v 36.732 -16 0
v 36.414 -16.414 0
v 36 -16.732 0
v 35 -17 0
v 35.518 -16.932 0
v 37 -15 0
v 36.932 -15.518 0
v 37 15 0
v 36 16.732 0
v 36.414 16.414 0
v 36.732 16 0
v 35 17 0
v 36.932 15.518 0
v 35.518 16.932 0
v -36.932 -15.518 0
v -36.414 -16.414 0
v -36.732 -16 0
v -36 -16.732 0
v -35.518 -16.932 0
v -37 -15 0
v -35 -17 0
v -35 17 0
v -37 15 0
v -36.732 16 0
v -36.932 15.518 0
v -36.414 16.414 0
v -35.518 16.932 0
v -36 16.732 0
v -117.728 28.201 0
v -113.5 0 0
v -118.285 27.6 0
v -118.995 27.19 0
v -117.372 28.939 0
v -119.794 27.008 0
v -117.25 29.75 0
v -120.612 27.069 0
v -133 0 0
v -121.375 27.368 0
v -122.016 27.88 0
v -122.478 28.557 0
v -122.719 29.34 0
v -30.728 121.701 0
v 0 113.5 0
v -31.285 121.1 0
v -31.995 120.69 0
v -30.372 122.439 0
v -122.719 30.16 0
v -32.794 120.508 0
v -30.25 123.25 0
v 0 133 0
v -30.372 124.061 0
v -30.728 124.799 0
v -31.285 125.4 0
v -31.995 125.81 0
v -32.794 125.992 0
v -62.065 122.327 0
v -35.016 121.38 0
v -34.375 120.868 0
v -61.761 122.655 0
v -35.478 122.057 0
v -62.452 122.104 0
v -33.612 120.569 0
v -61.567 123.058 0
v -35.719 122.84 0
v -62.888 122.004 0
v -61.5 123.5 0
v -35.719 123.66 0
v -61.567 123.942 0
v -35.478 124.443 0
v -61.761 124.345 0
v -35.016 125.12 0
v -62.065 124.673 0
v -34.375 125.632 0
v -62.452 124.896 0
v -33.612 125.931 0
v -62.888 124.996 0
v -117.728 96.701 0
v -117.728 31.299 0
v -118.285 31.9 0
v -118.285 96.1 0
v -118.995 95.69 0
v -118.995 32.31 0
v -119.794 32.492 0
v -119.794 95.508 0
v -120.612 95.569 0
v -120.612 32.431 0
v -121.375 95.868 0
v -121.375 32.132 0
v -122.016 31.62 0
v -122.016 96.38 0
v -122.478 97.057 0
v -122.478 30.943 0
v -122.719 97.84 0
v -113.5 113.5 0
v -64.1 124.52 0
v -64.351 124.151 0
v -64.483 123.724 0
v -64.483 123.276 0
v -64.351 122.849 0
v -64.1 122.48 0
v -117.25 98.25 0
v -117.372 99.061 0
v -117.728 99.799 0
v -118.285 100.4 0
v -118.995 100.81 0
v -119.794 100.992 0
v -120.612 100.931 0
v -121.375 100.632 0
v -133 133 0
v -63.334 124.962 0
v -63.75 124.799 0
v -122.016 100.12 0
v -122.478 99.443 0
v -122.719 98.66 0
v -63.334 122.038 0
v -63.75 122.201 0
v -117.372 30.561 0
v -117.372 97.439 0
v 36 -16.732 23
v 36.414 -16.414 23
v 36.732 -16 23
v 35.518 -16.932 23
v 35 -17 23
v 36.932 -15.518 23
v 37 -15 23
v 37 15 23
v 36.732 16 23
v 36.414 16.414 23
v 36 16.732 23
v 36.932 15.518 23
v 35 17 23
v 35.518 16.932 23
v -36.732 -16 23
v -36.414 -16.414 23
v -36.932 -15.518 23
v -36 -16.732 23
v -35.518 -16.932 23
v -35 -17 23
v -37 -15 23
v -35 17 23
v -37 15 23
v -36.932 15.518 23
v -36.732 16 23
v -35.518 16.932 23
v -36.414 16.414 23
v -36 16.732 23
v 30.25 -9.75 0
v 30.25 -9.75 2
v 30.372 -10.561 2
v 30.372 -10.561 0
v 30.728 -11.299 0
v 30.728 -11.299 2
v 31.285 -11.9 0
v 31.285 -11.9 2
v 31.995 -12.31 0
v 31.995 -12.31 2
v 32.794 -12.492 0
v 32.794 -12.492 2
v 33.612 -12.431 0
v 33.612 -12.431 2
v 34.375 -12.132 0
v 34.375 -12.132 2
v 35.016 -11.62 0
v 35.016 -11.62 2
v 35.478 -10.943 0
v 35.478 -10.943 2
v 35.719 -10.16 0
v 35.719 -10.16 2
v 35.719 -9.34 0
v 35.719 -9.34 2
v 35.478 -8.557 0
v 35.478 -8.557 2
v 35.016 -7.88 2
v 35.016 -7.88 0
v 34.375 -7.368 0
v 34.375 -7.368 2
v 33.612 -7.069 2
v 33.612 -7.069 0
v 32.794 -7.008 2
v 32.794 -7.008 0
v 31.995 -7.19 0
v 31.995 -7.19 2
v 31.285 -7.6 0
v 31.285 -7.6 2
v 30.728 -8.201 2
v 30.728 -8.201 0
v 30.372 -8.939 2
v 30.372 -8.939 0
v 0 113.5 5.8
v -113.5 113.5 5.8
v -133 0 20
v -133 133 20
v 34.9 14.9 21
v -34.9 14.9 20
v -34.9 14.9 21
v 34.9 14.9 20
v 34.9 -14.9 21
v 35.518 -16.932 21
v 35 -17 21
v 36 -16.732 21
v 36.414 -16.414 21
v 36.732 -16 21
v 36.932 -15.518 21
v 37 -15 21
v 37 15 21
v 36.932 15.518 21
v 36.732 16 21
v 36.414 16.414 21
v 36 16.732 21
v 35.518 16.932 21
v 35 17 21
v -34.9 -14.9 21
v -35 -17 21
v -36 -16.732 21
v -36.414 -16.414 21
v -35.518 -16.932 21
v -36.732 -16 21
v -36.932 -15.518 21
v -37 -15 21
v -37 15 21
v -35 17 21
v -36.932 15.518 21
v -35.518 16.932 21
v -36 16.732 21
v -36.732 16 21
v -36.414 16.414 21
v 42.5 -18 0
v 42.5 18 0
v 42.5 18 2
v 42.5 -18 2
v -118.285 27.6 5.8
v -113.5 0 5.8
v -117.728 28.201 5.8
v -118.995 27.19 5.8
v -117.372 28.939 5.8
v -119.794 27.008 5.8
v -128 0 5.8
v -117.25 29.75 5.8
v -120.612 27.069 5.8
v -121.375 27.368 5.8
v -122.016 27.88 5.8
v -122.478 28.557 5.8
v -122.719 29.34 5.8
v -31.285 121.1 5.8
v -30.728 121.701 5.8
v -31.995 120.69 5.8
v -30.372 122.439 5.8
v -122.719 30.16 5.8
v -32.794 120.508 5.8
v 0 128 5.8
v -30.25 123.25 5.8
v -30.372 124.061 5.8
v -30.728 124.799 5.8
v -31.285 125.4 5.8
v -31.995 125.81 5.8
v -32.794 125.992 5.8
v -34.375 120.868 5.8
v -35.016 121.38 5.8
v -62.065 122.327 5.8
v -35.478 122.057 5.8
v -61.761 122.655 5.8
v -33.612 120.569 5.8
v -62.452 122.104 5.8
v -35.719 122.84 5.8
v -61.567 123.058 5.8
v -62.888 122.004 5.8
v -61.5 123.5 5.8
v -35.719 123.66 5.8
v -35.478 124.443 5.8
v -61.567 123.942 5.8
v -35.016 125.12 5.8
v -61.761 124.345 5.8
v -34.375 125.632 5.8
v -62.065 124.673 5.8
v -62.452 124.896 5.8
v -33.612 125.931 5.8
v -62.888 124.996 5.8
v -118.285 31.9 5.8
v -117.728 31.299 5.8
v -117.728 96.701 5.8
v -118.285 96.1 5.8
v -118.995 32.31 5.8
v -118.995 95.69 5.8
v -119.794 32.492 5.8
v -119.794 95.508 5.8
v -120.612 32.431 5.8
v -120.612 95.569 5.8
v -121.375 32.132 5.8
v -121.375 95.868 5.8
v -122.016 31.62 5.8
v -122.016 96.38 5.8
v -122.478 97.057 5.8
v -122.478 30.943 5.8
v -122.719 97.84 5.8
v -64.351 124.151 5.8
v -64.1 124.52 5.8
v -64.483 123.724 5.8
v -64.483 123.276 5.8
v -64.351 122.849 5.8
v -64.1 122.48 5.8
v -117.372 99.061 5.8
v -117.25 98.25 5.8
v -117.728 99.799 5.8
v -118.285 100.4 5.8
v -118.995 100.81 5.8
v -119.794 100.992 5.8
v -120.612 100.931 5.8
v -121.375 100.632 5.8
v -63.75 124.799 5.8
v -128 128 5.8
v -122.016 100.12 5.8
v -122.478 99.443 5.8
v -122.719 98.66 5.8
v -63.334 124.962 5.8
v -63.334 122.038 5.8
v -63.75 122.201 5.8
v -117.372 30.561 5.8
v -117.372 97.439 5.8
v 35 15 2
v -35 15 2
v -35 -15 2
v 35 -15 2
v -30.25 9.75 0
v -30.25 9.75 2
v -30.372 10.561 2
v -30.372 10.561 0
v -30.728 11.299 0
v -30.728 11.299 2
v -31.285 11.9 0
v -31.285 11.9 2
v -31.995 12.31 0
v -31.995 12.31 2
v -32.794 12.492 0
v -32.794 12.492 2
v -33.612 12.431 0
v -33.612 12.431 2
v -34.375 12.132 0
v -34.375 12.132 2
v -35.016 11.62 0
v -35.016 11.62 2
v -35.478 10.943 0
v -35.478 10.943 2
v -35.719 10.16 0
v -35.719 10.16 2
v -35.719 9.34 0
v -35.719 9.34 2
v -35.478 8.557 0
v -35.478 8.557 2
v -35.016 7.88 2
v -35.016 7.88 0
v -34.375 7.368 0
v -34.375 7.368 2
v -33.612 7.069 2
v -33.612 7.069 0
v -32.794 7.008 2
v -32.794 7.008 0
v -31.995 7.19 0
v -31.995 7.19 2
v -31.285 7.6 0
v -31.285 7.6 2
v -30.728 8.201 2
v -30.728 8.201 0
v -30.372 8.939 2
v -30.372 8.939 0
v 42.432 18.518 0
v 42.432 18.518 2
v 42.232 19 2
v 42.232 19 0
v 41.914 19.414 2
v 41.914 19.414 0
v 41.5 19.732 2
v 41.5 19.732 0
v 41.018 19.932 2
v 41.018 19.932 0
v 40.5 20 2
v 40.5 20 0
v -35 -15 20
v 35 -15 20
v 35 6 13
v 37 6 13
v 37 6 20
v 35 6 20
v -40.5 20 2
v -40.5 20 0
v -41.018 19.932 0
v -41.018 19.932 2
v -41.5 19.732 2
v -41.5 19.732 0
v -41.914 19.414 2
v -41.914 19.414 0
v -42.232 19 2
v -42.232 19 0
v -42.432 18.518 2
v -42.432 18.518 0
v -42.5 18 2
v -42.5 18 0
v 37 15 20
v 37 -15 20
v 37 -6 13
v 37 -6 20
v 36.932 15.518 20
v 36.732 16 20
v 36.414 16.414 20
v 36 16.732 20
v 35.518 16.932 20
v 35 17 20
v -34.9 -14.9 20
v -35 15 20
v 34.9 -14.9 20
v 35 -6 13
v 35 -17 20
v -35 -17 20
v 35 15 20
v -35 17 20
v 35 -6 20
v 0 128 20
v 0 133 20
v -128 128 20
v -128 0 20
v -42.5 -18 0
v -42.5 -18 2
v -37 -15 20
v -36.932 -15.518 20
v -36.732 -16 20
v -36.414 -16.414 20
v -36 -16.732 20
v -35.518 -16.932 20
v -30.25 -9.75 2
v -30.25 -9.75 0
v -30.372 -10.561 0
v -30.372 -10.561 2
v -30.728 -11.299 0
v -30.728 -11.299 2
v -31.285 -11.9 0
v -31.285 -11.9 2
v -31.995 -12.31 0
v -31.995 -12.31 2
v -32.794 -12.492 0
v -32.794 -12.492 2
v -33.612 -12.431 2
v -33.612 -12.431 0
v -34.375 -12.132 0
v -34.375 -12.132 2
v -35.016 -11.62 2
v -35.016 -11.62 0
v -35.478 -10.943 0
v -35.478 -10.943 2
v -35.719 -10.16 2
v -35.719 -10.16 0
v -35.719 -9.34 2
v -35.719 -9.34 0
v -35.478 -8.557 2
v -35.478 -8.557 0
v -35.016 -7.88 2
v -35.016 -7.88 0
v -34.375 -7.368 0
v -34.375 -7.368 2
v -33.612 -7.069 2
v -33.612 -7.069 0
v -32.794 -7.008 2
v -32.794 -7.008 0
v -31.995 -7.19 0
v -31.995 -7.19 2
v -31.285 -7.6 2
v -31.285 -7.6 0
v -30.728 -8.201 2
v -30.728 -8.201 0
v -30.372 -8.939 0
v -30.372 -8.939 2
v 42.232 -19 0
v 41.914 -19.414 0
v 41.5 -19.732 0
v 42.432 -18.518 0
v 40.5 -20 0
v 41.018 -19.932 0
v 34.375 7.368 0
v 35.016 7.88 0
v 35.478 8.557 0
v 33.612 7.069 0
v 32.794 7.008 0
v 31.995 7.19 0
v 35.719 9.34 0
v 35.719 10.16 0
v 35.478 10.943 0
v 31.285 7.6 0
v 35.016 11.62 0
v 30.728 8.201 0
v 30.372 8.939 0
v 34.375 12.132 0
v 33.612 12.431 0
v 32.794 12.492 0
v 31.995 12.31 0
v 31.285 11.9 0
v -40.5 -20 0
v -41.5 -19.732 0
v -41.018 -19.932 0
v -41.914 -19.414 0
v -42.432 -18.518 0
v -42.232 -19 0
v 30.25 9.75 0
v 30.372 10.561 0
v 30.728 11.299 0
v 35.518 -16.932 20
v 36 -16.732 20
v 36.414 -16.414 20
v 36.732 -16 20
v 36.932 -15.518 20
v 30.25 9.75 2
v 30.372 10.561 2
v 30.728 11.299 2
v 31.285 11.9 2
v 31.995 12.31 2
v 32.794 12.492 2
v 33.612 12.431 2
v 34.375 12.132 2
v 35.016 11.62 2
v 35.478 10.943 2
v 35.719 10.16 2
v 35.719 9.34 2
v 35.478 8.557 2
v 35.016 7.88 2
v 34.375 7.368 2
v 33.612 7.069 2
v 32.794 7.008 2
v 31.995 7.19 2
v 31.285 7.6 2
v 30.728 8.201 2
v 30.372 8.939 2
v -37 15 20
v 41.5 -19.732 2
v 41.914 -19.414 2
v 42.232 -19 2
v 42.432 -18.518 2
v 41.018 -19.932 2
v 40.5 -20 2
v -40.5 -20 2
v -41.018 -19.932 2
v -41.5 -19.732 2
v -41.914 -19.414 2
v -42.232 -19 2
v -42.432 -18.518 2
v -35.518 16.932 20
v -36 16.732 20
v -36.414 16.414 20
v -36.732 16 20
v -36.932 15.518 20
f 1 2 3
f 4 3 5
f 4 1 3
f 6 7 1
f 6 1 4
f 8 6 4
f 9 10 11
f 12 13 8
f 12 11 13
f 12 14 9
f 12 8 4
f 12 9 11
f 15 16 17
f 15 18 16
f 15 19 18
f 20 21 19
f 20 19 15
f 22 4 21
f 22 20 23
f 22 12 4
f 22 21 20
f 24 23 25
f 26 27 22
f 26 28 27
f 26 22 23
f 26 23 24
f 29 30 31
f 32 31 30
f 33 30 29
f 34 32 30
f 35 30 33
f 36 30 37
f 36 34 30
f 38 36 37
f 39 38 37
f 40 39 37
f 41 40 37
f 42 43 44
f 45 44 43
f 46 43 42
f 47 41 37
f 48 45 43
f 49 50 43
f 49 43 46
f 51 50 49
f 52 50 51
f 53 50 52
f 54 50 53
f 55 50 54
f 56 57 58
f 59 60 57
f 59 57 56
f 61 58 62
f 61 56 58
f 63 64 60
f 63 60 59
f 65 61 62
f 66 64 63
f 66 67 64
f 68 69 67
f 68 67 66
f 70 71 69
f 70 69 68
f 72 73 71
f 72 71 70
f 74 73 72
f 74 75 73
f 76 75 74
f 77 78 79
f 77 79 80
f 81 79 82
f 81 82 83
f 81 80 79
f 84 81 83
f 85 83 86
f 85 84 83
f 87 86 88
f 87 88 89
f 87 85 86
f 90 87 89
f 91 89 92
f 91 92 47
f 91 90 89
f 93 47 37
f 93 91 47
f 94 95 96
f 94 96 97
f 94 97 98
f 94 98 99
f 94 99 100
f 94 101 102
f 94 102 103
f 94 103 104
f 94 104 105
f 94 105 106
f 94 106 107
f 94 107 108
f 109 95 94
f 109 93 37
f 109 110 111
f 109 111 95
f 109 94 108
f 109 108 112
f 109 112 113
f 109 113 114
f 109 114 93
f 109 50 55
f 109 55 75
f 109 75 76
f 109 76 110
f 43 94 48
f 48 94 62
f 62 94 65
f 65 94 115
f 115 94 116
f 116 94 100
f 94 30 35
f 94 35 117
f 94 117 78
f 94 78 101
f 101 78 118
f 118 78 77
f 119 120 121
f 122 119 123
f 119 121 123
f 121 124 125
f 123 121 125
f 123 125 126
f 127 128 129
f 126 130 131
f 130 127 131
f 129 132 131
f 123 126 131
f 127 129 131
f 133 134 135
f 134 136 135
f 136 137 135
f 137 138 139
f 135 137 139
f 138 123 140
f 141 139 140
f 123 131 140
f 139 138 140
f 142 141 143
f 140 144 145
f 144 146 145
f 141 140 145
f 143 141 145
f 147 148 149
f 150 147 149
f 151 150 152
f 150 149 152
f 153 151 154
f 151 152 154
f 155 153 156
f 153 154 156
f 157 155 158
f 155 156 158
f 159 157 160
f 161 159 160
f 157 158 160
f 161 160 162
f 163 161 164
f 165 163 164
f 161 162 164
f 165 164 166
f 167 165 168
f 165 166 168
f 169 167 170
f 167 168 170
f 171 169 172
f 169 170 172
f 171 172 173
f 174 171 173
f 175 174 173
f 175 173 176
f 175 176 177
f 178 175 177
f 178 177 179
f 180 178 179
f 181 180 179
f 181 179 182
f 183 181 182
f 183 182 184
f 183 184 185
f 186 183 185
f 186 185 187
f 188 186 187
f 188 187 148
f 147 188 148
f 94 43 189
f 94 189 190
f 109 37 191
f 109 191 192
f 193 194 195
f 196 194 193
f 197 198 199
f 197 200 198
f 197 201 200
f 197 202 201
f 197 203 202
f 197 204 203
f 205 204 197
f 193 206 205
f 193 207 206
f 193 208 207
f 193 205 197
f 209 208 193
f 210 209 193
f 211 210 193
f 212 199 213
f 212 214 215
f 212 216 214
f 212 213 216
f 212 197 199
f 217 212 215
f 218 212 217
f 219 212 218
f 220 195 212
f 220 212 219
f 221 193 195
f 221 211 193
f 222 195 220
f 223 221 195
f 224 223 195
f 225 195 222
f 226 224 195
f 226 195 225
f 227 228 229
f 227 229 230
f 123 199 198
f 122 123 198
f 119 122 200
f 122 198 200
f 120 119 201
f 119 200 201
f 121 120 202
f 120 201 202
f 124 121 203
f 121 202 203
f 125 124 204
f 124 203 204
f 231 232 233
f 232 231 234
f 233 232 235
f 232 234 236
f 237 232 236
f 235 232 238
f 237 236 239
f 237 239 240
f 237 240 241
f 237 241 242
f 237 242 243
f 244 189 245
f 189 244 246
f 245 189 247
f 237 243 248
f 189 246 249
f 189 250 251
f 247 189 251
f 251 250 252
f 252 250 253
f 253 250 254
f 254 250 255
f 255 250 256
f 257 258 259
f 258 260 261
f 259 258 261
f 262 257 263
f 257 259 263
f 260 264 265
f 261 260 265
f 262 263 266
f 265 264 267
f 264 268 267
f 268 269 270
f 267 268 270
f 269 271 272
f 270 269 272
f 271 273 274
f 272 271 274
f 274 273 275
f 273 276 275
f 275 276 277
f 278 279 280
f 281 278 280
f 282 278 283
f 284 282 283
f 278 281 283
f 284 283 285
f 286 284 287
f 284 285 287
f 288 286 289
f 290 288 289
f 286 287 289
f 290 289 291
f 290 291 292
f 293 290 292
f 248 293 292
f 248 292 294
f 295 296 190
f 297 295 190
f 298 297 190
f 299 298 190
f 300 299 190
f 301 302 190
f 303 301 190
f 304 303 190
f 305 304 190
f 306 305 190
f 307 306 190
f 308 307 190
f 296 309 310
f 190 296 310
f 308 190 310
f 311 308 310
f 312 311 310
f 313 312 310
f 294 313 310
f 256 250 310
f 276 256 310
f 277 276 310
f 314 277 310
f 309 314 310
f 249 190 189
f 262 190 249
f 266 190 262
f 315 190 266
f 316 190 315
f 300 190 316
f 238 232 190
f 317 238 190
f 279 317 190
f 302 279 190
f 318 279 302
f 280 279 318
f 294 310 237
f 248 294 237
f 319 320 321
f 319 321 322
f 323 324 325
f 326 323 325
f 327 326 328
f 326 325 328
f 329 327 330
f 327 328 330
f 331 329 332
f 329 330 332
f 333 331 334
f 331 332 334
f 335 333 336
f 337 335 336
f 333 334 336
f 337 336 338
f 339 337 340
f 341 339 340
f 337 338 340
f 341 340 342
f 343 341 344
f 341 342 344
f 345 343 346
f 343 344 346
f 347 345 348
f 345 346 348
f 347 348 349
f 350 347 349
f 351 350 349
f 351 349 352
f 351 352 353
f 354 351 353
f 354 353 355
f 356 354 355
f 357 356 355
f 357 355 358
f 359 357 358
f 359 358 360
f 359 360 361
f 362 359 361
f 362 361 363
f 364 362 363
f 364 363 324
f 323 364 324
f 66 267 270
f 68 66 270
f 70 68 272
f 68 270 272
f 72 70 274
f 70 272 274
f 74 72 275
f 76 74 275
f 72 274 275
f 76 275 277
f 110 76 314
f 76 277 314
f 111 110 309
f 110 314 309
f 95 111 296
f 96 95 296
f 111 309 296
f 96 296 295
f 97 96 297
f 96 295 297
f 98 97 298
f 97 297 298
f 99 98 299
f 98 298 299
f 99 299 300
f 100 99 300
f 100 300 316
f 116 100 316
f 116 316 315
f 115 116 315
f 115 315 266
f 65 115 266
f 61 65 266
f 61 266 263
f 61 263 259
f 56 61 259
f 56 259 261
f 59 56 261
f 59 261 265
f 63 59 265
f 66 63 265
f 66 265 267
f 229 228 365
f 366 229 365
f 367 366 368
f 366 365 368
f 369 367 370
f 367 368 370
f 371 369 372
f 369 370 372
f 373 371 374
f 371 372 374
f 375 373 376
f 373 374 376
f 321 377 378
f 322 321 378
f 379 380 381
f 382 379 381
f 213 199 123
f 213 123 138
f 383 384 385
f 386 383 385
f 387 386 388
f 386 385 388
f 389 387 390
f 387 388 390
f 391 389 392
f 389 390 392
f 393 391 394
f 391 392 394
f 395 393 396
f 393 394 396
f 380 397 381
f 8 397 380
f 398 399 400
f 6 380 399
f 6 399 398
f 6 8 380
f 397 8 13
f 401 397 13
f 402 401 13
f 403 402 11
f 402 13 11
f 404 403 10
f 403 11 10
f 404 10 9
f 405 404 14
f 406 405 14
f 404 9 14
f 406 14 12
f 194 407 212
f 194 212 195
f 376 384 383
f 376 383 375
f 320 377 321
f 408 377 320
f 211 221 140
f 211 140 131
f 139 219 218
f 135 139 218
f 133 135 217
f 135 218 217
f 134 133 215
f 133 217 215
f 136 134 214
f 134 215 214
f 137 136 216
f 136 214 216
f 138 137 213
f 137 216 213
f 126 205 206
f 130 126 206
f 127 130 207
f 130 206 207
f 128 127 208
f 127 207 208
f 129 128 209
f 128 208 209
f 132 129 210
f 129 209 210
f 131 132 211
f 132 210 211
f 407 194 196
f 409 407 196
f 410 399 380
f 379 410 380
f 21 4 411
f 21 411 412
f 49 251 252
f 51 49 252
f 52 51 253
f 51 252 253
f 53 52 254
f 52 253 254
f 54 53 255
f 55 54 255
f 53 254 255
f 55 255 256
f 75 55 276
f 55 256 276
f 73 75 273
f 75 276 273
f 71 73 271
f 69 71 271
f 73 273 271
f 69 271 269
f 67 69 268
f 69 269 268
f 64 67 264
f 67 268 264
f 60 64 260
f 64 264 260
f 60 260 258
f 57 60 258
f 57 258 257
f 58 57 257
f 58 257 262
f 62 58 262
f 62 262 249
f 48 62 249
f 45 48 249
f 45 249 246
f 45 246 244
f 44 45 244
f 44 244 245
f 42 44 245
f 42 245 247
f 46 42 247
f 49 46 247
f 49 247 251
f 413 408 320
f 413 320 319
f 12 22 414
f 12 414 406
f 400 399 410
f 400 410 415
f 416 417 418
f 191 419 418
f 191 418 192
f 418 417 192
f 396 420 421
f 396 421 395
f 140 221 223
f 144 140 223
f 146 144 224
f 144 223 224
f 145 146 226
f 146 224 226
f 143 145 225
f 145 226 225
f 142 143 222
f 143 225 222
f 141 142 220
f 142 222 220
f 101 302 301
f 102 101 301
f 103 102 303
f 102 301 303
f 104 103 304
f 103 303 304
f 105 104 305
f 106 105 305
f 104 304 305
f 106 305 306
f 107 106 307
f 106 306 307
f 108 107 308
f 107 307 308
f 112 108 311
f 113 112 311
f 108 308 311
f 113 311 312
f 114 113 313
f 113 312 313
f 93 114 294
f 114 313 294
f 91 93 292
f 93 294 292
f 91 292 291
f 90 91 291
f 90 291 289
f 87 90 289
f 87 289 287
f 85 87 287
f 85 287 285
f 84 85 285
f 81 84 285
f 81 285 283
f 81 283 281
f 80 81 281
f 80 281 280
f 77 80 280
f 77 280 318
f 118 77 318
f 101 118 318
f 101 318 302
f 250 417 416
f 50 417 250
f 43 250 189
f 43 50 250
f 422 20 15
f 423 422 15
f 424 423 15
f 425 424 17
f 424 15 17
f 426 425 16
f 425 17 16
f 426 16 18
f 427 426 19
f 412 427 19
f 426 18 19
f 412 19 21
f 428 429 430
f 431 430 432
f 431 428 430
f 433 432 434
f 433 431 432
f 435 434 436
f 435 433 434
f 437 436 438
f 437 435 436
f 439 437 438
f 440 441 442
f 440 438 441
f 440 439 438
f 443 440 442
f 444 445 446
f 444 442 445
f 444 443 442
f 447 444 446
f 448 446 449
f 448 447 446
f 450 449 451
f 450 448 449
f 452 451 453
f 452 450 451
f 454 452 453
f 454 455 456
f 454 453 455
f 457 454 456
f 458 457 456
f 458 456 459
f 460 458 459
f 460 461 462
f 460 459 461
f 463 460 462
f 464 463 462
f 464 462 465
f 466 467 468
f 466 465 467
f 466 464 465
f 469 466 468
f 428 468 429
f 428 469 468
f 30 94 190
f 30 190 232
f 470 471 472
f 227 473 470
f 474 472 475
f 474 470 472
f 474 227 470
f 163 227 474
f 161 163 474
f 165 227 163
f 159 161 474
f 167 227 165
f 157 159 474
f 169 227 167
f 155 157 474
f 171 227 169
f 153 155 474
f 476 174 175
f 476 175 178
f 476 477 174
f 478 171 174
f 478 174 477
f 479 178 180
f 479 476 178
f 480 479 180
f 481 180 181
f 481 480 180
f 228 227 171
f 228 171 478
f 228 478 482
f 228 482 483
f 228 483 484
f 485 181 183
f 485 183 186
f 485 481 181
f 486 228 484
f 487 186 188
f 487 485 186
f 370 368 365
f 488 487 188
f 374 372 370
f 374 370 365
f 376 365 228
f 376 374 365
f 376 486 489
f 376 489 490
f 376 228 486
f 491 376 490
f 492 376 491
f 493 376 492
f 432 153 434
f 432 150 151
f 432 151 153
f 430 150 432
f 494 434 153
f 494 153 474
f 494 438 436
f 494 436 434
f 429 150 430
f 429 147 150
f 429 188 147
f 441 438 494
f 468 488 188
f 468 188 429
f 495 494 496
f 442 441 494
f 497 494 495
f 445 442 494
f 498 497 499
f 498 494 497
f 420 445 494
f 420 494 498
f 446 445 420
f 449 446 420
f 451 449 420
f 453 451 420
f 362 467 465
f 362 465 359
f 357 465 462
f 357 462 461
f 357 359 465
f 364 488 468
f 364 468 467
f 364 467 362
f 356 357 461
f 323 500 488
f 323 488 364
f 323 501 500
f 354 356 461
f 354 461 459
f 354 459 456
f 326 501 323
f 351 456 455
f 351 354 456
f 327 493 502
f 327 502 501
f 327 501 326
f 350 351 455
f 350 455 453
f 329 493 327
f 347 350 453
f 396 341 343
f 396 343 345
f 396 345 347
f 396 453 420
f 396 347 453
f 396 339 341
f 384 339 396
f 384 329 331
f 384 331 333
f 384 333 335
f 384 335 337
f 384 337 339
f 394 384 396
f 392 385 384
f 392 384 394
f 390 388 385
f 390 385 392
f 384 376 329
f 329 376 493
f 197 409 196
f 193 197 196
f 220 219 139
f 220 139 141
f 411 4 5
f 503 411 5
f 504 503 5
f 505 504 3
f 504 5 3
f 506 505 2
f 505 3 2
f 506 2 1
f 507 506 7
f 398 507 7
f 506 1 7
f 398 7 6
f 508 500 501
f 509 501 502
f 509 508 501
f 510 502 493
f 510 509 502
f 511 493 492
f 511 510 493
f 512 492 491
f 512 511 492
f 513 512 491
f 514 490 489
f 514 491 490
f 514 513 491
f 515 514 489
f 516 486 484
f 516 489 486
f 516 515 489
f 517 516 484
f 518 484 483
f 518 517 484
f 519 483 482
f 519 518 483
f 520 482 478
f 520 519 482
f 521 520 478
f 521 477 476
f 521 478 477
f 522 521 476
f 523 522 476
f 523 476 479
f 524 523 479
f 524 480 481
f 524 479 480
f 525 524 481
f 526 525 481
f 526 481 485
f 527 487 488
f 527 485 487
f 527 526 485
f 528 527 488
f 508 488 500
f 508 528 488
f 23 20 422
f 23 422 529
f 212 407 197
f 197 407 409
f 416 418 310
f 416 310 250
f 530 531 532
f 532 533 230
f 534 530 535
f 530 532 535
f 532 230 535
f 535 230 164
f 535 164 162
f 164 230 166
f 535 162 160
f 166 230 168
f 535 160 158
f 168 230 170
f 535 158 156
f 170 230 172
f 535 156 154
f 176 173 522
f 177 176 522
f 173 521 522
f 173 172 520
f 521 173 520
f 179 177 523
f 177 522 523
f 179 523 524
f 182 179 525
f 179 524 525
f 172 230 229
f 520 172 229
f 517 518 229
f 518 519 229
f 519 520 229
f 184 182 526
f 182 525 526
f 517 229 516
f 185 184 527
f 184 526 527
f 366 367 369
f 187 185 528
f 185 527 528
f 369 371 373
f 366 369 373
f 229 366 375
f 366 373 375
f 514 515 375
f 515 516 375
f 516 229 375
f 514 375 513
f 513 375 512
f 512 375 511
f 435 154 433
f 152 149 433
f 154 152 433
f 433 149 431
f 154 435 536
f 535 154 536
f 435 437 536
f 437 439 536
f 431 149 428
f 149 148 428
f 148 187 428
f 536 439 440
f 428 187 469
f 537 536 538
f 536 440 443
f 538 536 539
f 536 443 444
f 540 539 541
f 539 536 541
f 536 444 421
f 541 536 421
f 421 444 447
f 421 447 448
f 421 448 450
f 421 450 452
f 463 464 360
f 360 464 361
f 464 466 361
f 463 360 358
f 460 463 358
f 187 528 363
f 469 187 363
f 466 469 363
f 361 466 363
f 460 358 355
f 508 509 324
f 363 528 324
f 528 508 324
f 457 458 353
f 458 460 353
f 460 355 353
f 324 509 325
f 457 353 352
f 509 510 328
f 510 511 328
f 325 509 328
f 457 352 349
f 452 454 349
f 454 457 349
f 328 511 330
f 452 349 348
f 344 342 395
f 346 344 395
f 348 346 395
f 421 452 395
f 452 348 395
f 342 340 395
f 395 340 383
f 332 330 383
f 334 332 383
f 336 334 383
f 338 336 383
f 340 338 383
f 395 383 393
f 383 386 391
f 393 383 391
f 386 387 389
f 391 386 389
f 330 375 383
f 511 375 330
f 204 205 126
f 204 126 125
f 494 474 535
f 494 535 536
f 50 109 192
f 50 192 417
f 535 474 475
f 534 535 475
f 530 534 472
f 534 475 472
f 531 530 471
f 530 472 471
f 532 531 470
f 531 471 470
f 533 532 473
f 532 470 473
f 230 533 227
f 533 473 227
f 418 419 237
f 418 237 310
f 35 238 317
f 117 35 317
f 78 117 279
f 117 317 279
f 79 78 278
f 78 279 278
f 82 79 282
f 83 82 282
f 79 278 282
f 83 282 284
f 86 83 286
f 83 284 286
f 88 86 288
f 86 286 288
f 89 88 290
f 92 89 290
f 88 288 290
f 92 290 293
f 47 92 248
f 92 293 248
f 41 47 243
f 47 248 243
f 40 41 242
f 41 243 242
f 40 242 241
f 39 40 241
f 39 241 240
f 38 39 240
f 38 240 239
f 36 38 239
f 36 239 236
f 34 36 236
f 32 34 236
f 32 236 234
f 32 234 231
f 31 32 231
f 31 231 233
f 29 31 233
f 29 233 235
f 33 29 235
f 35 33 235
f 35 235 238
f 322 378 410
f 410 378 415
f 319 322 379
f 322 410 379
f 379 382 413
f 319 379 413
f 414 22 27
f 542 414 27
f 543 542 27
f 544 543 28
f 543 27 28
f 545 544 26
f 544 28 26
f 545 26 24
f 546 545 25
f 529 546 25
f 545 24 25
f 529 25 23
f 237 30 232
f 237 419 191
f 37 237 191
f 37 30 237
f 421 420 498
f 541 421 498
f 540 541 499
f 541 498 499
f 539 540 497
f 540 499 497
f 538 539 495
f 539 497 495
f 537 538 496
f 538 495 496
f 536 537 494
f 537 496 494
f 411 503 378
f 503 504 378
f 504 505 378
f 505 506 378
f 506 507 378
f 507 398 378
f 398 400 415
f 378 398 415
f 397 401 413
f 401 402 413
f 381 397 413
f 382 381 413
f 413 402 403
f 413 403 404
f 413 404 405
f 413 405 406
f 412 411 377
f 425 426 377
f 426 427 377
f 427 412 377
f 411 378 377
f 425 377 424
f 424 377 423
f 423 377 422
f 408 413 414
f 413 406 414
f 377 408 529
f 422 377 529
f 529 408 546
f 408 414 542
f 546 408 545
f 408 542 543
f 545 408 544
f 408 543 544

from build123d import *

# Parameters (mm, degrees)
PAD_DEPTH                   = 20
POCKET_DEPTH                = 14.2
SKETCH002_R                 = 2.75
HOLE_DEPTH                  = 25
SKETCH003_R                 = 1.5
HOLE001_DEPTH               = 25
PAD001_DEPTH                = 2
SKETCH005_R                 = 2.75
HOLE002_DEPTH               = 25
SKETCH005_MIRRORED002_2_R   = 2.75
HOLE002_MIRRORED002_2_DEPTH = 25
PAD002_DEPTH                = 20
SKETCH007_W                 = 70
SKETCH007_H                 = 30
POCKET001_DEPTH             = 18
SKETCH010_W                 = 12
SKETCH010_H                 = 7
POCKET002_DEPTH             = 5
SKETCH009_W                 = 69.8
SKETCH009_H                 = 29.8
PAD003_DEPTH                = 1
PAD004_DEPTH                = 2


with BuildPart() as bezel:
    # Sketch001 → Pad (new body)
    with BuildSketch(Plane.XY):
        Polygon((-133, 133), (0, 133), (0, 113.5), (-113.5, 113.5), (-113.5, 0), (-133, 0), align=None)
    extrude(amount=PAD_DEPTH)

    # Sketch → Pocket (cut)
    with BuildSketch(Plane.XY.offset(20)):
        Polygon((-128, 128), (0, 128), (0, 113.5), (-113.5, 113.5), (-113.5, 0), (-128, 0), align=None)
    extrude(amount=-POCKET_DEPTH, mode=Mode.SUBTRACT)

    # Sketch002 → Hole (cut)
    with BuildSketch(Plane.XY.offset(5.8)):
        with Locations((-120, 29.75)):
            Circle(SKETCH002_R)
        with Locations((-33, 123.25)):
            Circle(SKETCH002_R)
        with Locations((-120, 98.25)):
            Circle(SKETCH002_R)
    extrude(amount=-HOLE_DEPTH, mode=Mode.SUBTRACT)

    # Sketch003 → Hole001 (cut)
    with BuildSketch(Plane.XY.offset(5.8)):
        with Locations((-63, 123.5)):
            Circle(SKETCH003_R)
    extrude(amount=-HOLE001_DEPTH, mode=Mode.SUBTRACT)


with BuildPart() as center_bracket:
    # Sketch004 → Pad001 (new body)
    with BuildSketch(Plane.XY):
        with BuildLine():
            Line((-40.5, 20), (40.5, 20))
            ThreePointArc((42.5, 18), (41.914214, 19.414214), (40.5, 20))
            Line((42.5, 18), (42.5, -18))
            ThreePointArc((40.5, -20), (41.914214, -19.414214), (42.5, -18))
            Line((40.5, -20), (-40.5, -20))
            ThreePointArc((-42.5, -18), (-41.914214, -19.414214), (-40.5, -20))
            Line((-42.5, -18), (-42.5, 18))
            ThreePointArc((-40.5, 20), (-41.914214, 19.414214), (-42.5, 18))
        make_face()
    extrude(amount=PAD001_DEPTH)

    # Sketch005 → Hole002 (cut)
    with BuildSketch(Plane.XY.offset(2)):
        with Locations((-33, 9.75)):
            Circle(SKETCH005_R)
    hole002 = extrude(amount=-HOLE002_DEPTH, mode=Mode.SUBTRACT)

    # Sketch005 Mirrored002 2 → Hole002 Mirrored002 2 (cut)
    with BuildSketch(Plane(origin=(0, 0, 2), x_dir=(-1, 0, 0), z_dir=(0, 0, -1))):
        with Locations((-33, 9.75)):
            Circle(SKETCH005_MIRRORED002_2_R)
    hole002_mirrored002_2 = extrude(amount=HOLE002_MIRRORED002_2_DEPTH, mode=Mode.SUBTRACT)

    # Mirrored003: Hole002, Hole002 Mirrored002 2 across XZ
    add(hole002.mirror(Plane.XZ), mode=Mode.SUBTRACT)
    add(hole002_mirrored002_2.mirror(Plane.XZ), mode=Mode.SUBTRACT)


with BuildPart() as pico_case:
    # Sketch006 → Pad002 (new body)
    with BuildSketch(Plane.XY):
        with BuildLine():
            Line((-35, 17), (35, 17))
            ThreePointArc((37, 15), (36.414214, 16.414214), (35, 17))
            Line((37, 15), (37, -15))
            ThreePointArc((35, -17), (36.414214, -16.414214), (37, -15))
            Line((35, -17), (-35, -17))
            ThreePointArc((-37, -15), (-36.414214, -16.414214), (-35, -17))
            Line((-37, -15), (-37, 15))
            ThreePointArc((-35, 17), (-36.414214, 16.414214), (-37, 15))
        make_face()
    extrude(amount=PAD002_DEPTH)

    # Sketch007 → Pocket001 (cut)
    with BuildSketch(Plane.XY.offset(20)):
        Rectangle(SKETCH007_W, SKETCH007_H)
    extrude(amount=-POCKET001_DEPTH, mode=Mode.SUBTRACT)

    # Sketch010 → Pocket002 (cut)
    with BuildSketch(Plane.YZ.offset(37)):
        with Locations((0, 16.5)):
            Rectangle(SKETCH010_W, SKETCH010_H)
    extrude(amount=-POCKET002_DEPTH, mode=Mode.SUBTRACT)


with BuildPart() as lid:
    # Sketch009 → Pad003 (new body)
    with BuildSketch(Plane.XY.offset(20)):
        Rectangle(SKETCH009_W, SKETCH009_H)
    extrude(amount=PAD003_DEPTH)

    # Sketch008 → Pad004 (join)
    with BuildSketch(Plane.XY.offset(21)):
        with BuildLine():
            Line((-35, 17), (35, 17))
            ThreePointArc((37, 15), (36.414214, 16.414214), (35, 17))
            Line((37, 15), (37, -15))
            ThreePointArc((35, -17), (36.414214, -16.414214), (37, -15))
            Line((35, -17), (-35, -17))
            ThreePointArc((-37, -15), (-36.414214, -16.414214), (-35, -17))
            Line((-37, -15), (-37, 15))
            ThreePointArc((-35, 17), (-36.414214, 16.414214), (-37, 15))
        make_face()
    extrude(amount=PAD004_DEPTH)


solid = Compound([bezel.part, center_bracket.part, pico_case.part, lid.part])
